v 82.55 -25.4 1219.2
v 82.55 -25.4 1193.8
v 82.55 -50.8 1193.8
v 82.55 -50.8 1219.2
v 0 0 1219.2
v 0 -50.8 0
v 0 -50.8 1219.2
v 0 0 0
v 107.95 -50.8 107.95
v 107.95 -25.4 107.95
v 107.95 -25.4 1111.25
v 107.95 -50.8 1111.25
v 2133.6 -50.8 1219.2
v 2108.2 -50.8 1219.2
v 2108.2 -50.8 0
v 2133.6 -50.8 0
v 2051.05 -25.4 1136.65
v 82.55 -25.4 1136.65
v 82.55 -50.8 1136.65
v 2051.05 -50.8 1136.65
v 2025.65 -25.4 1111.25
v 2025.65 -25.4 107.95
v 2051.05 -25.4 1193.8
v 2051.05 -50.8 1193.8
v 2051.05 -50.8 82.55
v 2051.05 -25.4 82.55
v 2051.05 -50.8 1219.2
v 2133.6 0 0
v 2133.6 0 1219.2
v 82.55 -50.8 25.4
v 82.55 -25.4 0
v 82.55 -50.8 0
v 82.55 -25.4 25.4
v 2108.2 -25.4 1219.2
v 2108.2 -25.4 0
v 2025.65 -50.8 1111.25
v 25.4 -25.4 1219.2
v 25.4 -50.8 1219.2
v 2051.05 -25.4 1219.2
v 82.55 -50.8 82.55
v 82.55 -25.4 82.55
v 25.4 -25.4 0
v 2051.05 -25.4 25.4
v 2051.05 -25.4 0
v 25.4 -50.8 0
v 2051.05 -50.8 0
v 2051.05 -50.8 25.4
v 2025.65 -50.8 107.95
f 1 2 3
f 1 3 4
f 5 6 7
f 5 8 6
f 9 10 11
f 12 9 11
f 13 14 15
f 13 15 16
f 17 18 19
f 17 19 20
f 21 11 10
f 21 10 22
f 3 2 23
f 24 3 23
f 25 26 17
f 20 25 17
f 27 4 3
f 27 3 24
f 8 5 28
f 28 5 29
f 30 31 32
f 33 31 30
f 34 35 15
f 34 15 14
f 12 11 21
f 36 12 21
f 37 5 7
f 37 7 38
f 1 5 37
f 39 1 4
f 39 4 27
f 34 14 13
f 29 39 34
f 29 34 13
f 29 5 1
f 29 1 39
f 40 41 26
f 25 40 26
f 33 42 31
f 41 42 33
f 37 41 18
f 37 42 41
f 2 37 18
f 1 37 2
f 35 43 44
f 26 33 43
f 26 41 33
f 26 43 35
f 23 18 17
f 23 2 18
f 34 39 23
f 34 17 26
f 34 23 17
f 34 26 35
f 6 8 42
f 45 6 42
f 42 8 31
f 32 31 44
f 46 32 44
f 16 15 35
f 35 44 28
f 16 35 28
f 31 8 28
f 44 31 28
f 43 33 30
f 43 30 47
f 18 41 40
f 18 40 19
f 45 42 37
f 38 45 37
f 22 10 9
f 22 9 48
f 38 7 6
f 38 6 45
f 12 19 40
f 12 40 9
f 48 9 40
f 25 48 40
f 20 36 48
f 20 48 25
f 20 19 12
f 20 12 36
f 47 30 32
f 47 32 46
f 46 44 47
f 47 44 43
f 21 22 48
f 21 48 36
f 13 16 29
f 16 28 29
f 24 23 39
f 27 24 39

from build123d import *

# Parameters (mm, degrees)
F0_W      = 2133.6
F0_H      = 1219.2
F1_DEPTH  = 25.4
F2_W      = 1968.5
F2_H      = 25.4
F3_DEPTH  = 25.4
F4_W      = 1968.5
F4_H      = 25.4
F5_DEPTH  = 25.4
F6_W      = 25.4
F6_H      = 1219.2
F7_DEPTH  = 25.4
F8_W      = 25.4
F8_H      = 1219.2
F9_DEPTH  = 25.4
F10_W     = 1968.5
F10_H     = 25.4
F11_DEPTH = 25.4
F12_W     = 1968.5
F12_H     = 25.4
F13_DEPTH = 25.4
F14_W     = 25.4
F14_H     = 1003.3
F15_DEPTH = 25.4
F16_W     = 25.4
F16_H     = 1003.3
F17_DEPTH = 25.4


with BuildPart() as f1:
    # F0 (on Front) → F1 (new body)
    with BuildSketch(Plane.XZ):
        with Locations((1066.8, 609.6)):
            Rectangle(F0_W, F0_H)
    extrude(amount=F1_DEPTH)

    # F2 (on face) → F3 (join)
    with BuildSketch(Plane.XZ.offset(25.4)):
        with Locations((1066.8, 1206.5)):
            Rectangle(F2_W, F2_H)
    extrude(amount=F3_DEPTH)

    # F4 (on face) → F5 (join)
    with BuildSketch(Plane.XZ.offset(25.4)):
        with Locations((1066.8, 12.7)):
            Rectangle(F4_W, F4_H)
    extrude(amount=F5_DEPTH)

    # F6 (on face) → F7 (join)
    with BuildSketch(Plane.XZ.offset(25.4)):
        with Locations((12.7, 609.6)):
            Rectangle(F6_W, F6_H)
    extrude(amount=F7_DEPTH)

    # F8 (on face) → F9 (join)
    with BuildSketch(Plane.XZ.offset(25.4)):
        with Locations((2120.9, 609.6)):
            Rectangle(F8_W, F8_H)
    extrude(amount=F9_DEPTH)

    # F10 (on face) → F11 (join)
    with BuildSketch(Plane.XZ.offset(25.4)):
        with Locations((1066.8, 1123.95)):
            Rectangle(F10_W, F10_H)
    extrude(amount=F11_DEPTH)

    # F12 (on face) → F13 (join)
    with BuildSketch(Plane.XZ.offset(25.4)):
        with Locations((1066.8, 95.25)):
            Rectangle(F12_W, F12_H)
    extrude(amount=F13_DEPTH)

    # F14 (on face) → F15 (join)
    with BuildSketch(Plane.XZ.offset(25.4)):
        with Locations((2038.35, 609.6)):
            Rectangle(F14_W, F14_H)
    extrude(amount=F15_DEPTH)

    # F16 (on face) → F17 (join)
    with BuildSketch(Plane.XZ.offset(25.4)):
        with Locations((95.25, 609.6)):
            Rectangle(F16_W, F16_H)
    extrude(amount=F17_DEPTH)


solid = f1.part
